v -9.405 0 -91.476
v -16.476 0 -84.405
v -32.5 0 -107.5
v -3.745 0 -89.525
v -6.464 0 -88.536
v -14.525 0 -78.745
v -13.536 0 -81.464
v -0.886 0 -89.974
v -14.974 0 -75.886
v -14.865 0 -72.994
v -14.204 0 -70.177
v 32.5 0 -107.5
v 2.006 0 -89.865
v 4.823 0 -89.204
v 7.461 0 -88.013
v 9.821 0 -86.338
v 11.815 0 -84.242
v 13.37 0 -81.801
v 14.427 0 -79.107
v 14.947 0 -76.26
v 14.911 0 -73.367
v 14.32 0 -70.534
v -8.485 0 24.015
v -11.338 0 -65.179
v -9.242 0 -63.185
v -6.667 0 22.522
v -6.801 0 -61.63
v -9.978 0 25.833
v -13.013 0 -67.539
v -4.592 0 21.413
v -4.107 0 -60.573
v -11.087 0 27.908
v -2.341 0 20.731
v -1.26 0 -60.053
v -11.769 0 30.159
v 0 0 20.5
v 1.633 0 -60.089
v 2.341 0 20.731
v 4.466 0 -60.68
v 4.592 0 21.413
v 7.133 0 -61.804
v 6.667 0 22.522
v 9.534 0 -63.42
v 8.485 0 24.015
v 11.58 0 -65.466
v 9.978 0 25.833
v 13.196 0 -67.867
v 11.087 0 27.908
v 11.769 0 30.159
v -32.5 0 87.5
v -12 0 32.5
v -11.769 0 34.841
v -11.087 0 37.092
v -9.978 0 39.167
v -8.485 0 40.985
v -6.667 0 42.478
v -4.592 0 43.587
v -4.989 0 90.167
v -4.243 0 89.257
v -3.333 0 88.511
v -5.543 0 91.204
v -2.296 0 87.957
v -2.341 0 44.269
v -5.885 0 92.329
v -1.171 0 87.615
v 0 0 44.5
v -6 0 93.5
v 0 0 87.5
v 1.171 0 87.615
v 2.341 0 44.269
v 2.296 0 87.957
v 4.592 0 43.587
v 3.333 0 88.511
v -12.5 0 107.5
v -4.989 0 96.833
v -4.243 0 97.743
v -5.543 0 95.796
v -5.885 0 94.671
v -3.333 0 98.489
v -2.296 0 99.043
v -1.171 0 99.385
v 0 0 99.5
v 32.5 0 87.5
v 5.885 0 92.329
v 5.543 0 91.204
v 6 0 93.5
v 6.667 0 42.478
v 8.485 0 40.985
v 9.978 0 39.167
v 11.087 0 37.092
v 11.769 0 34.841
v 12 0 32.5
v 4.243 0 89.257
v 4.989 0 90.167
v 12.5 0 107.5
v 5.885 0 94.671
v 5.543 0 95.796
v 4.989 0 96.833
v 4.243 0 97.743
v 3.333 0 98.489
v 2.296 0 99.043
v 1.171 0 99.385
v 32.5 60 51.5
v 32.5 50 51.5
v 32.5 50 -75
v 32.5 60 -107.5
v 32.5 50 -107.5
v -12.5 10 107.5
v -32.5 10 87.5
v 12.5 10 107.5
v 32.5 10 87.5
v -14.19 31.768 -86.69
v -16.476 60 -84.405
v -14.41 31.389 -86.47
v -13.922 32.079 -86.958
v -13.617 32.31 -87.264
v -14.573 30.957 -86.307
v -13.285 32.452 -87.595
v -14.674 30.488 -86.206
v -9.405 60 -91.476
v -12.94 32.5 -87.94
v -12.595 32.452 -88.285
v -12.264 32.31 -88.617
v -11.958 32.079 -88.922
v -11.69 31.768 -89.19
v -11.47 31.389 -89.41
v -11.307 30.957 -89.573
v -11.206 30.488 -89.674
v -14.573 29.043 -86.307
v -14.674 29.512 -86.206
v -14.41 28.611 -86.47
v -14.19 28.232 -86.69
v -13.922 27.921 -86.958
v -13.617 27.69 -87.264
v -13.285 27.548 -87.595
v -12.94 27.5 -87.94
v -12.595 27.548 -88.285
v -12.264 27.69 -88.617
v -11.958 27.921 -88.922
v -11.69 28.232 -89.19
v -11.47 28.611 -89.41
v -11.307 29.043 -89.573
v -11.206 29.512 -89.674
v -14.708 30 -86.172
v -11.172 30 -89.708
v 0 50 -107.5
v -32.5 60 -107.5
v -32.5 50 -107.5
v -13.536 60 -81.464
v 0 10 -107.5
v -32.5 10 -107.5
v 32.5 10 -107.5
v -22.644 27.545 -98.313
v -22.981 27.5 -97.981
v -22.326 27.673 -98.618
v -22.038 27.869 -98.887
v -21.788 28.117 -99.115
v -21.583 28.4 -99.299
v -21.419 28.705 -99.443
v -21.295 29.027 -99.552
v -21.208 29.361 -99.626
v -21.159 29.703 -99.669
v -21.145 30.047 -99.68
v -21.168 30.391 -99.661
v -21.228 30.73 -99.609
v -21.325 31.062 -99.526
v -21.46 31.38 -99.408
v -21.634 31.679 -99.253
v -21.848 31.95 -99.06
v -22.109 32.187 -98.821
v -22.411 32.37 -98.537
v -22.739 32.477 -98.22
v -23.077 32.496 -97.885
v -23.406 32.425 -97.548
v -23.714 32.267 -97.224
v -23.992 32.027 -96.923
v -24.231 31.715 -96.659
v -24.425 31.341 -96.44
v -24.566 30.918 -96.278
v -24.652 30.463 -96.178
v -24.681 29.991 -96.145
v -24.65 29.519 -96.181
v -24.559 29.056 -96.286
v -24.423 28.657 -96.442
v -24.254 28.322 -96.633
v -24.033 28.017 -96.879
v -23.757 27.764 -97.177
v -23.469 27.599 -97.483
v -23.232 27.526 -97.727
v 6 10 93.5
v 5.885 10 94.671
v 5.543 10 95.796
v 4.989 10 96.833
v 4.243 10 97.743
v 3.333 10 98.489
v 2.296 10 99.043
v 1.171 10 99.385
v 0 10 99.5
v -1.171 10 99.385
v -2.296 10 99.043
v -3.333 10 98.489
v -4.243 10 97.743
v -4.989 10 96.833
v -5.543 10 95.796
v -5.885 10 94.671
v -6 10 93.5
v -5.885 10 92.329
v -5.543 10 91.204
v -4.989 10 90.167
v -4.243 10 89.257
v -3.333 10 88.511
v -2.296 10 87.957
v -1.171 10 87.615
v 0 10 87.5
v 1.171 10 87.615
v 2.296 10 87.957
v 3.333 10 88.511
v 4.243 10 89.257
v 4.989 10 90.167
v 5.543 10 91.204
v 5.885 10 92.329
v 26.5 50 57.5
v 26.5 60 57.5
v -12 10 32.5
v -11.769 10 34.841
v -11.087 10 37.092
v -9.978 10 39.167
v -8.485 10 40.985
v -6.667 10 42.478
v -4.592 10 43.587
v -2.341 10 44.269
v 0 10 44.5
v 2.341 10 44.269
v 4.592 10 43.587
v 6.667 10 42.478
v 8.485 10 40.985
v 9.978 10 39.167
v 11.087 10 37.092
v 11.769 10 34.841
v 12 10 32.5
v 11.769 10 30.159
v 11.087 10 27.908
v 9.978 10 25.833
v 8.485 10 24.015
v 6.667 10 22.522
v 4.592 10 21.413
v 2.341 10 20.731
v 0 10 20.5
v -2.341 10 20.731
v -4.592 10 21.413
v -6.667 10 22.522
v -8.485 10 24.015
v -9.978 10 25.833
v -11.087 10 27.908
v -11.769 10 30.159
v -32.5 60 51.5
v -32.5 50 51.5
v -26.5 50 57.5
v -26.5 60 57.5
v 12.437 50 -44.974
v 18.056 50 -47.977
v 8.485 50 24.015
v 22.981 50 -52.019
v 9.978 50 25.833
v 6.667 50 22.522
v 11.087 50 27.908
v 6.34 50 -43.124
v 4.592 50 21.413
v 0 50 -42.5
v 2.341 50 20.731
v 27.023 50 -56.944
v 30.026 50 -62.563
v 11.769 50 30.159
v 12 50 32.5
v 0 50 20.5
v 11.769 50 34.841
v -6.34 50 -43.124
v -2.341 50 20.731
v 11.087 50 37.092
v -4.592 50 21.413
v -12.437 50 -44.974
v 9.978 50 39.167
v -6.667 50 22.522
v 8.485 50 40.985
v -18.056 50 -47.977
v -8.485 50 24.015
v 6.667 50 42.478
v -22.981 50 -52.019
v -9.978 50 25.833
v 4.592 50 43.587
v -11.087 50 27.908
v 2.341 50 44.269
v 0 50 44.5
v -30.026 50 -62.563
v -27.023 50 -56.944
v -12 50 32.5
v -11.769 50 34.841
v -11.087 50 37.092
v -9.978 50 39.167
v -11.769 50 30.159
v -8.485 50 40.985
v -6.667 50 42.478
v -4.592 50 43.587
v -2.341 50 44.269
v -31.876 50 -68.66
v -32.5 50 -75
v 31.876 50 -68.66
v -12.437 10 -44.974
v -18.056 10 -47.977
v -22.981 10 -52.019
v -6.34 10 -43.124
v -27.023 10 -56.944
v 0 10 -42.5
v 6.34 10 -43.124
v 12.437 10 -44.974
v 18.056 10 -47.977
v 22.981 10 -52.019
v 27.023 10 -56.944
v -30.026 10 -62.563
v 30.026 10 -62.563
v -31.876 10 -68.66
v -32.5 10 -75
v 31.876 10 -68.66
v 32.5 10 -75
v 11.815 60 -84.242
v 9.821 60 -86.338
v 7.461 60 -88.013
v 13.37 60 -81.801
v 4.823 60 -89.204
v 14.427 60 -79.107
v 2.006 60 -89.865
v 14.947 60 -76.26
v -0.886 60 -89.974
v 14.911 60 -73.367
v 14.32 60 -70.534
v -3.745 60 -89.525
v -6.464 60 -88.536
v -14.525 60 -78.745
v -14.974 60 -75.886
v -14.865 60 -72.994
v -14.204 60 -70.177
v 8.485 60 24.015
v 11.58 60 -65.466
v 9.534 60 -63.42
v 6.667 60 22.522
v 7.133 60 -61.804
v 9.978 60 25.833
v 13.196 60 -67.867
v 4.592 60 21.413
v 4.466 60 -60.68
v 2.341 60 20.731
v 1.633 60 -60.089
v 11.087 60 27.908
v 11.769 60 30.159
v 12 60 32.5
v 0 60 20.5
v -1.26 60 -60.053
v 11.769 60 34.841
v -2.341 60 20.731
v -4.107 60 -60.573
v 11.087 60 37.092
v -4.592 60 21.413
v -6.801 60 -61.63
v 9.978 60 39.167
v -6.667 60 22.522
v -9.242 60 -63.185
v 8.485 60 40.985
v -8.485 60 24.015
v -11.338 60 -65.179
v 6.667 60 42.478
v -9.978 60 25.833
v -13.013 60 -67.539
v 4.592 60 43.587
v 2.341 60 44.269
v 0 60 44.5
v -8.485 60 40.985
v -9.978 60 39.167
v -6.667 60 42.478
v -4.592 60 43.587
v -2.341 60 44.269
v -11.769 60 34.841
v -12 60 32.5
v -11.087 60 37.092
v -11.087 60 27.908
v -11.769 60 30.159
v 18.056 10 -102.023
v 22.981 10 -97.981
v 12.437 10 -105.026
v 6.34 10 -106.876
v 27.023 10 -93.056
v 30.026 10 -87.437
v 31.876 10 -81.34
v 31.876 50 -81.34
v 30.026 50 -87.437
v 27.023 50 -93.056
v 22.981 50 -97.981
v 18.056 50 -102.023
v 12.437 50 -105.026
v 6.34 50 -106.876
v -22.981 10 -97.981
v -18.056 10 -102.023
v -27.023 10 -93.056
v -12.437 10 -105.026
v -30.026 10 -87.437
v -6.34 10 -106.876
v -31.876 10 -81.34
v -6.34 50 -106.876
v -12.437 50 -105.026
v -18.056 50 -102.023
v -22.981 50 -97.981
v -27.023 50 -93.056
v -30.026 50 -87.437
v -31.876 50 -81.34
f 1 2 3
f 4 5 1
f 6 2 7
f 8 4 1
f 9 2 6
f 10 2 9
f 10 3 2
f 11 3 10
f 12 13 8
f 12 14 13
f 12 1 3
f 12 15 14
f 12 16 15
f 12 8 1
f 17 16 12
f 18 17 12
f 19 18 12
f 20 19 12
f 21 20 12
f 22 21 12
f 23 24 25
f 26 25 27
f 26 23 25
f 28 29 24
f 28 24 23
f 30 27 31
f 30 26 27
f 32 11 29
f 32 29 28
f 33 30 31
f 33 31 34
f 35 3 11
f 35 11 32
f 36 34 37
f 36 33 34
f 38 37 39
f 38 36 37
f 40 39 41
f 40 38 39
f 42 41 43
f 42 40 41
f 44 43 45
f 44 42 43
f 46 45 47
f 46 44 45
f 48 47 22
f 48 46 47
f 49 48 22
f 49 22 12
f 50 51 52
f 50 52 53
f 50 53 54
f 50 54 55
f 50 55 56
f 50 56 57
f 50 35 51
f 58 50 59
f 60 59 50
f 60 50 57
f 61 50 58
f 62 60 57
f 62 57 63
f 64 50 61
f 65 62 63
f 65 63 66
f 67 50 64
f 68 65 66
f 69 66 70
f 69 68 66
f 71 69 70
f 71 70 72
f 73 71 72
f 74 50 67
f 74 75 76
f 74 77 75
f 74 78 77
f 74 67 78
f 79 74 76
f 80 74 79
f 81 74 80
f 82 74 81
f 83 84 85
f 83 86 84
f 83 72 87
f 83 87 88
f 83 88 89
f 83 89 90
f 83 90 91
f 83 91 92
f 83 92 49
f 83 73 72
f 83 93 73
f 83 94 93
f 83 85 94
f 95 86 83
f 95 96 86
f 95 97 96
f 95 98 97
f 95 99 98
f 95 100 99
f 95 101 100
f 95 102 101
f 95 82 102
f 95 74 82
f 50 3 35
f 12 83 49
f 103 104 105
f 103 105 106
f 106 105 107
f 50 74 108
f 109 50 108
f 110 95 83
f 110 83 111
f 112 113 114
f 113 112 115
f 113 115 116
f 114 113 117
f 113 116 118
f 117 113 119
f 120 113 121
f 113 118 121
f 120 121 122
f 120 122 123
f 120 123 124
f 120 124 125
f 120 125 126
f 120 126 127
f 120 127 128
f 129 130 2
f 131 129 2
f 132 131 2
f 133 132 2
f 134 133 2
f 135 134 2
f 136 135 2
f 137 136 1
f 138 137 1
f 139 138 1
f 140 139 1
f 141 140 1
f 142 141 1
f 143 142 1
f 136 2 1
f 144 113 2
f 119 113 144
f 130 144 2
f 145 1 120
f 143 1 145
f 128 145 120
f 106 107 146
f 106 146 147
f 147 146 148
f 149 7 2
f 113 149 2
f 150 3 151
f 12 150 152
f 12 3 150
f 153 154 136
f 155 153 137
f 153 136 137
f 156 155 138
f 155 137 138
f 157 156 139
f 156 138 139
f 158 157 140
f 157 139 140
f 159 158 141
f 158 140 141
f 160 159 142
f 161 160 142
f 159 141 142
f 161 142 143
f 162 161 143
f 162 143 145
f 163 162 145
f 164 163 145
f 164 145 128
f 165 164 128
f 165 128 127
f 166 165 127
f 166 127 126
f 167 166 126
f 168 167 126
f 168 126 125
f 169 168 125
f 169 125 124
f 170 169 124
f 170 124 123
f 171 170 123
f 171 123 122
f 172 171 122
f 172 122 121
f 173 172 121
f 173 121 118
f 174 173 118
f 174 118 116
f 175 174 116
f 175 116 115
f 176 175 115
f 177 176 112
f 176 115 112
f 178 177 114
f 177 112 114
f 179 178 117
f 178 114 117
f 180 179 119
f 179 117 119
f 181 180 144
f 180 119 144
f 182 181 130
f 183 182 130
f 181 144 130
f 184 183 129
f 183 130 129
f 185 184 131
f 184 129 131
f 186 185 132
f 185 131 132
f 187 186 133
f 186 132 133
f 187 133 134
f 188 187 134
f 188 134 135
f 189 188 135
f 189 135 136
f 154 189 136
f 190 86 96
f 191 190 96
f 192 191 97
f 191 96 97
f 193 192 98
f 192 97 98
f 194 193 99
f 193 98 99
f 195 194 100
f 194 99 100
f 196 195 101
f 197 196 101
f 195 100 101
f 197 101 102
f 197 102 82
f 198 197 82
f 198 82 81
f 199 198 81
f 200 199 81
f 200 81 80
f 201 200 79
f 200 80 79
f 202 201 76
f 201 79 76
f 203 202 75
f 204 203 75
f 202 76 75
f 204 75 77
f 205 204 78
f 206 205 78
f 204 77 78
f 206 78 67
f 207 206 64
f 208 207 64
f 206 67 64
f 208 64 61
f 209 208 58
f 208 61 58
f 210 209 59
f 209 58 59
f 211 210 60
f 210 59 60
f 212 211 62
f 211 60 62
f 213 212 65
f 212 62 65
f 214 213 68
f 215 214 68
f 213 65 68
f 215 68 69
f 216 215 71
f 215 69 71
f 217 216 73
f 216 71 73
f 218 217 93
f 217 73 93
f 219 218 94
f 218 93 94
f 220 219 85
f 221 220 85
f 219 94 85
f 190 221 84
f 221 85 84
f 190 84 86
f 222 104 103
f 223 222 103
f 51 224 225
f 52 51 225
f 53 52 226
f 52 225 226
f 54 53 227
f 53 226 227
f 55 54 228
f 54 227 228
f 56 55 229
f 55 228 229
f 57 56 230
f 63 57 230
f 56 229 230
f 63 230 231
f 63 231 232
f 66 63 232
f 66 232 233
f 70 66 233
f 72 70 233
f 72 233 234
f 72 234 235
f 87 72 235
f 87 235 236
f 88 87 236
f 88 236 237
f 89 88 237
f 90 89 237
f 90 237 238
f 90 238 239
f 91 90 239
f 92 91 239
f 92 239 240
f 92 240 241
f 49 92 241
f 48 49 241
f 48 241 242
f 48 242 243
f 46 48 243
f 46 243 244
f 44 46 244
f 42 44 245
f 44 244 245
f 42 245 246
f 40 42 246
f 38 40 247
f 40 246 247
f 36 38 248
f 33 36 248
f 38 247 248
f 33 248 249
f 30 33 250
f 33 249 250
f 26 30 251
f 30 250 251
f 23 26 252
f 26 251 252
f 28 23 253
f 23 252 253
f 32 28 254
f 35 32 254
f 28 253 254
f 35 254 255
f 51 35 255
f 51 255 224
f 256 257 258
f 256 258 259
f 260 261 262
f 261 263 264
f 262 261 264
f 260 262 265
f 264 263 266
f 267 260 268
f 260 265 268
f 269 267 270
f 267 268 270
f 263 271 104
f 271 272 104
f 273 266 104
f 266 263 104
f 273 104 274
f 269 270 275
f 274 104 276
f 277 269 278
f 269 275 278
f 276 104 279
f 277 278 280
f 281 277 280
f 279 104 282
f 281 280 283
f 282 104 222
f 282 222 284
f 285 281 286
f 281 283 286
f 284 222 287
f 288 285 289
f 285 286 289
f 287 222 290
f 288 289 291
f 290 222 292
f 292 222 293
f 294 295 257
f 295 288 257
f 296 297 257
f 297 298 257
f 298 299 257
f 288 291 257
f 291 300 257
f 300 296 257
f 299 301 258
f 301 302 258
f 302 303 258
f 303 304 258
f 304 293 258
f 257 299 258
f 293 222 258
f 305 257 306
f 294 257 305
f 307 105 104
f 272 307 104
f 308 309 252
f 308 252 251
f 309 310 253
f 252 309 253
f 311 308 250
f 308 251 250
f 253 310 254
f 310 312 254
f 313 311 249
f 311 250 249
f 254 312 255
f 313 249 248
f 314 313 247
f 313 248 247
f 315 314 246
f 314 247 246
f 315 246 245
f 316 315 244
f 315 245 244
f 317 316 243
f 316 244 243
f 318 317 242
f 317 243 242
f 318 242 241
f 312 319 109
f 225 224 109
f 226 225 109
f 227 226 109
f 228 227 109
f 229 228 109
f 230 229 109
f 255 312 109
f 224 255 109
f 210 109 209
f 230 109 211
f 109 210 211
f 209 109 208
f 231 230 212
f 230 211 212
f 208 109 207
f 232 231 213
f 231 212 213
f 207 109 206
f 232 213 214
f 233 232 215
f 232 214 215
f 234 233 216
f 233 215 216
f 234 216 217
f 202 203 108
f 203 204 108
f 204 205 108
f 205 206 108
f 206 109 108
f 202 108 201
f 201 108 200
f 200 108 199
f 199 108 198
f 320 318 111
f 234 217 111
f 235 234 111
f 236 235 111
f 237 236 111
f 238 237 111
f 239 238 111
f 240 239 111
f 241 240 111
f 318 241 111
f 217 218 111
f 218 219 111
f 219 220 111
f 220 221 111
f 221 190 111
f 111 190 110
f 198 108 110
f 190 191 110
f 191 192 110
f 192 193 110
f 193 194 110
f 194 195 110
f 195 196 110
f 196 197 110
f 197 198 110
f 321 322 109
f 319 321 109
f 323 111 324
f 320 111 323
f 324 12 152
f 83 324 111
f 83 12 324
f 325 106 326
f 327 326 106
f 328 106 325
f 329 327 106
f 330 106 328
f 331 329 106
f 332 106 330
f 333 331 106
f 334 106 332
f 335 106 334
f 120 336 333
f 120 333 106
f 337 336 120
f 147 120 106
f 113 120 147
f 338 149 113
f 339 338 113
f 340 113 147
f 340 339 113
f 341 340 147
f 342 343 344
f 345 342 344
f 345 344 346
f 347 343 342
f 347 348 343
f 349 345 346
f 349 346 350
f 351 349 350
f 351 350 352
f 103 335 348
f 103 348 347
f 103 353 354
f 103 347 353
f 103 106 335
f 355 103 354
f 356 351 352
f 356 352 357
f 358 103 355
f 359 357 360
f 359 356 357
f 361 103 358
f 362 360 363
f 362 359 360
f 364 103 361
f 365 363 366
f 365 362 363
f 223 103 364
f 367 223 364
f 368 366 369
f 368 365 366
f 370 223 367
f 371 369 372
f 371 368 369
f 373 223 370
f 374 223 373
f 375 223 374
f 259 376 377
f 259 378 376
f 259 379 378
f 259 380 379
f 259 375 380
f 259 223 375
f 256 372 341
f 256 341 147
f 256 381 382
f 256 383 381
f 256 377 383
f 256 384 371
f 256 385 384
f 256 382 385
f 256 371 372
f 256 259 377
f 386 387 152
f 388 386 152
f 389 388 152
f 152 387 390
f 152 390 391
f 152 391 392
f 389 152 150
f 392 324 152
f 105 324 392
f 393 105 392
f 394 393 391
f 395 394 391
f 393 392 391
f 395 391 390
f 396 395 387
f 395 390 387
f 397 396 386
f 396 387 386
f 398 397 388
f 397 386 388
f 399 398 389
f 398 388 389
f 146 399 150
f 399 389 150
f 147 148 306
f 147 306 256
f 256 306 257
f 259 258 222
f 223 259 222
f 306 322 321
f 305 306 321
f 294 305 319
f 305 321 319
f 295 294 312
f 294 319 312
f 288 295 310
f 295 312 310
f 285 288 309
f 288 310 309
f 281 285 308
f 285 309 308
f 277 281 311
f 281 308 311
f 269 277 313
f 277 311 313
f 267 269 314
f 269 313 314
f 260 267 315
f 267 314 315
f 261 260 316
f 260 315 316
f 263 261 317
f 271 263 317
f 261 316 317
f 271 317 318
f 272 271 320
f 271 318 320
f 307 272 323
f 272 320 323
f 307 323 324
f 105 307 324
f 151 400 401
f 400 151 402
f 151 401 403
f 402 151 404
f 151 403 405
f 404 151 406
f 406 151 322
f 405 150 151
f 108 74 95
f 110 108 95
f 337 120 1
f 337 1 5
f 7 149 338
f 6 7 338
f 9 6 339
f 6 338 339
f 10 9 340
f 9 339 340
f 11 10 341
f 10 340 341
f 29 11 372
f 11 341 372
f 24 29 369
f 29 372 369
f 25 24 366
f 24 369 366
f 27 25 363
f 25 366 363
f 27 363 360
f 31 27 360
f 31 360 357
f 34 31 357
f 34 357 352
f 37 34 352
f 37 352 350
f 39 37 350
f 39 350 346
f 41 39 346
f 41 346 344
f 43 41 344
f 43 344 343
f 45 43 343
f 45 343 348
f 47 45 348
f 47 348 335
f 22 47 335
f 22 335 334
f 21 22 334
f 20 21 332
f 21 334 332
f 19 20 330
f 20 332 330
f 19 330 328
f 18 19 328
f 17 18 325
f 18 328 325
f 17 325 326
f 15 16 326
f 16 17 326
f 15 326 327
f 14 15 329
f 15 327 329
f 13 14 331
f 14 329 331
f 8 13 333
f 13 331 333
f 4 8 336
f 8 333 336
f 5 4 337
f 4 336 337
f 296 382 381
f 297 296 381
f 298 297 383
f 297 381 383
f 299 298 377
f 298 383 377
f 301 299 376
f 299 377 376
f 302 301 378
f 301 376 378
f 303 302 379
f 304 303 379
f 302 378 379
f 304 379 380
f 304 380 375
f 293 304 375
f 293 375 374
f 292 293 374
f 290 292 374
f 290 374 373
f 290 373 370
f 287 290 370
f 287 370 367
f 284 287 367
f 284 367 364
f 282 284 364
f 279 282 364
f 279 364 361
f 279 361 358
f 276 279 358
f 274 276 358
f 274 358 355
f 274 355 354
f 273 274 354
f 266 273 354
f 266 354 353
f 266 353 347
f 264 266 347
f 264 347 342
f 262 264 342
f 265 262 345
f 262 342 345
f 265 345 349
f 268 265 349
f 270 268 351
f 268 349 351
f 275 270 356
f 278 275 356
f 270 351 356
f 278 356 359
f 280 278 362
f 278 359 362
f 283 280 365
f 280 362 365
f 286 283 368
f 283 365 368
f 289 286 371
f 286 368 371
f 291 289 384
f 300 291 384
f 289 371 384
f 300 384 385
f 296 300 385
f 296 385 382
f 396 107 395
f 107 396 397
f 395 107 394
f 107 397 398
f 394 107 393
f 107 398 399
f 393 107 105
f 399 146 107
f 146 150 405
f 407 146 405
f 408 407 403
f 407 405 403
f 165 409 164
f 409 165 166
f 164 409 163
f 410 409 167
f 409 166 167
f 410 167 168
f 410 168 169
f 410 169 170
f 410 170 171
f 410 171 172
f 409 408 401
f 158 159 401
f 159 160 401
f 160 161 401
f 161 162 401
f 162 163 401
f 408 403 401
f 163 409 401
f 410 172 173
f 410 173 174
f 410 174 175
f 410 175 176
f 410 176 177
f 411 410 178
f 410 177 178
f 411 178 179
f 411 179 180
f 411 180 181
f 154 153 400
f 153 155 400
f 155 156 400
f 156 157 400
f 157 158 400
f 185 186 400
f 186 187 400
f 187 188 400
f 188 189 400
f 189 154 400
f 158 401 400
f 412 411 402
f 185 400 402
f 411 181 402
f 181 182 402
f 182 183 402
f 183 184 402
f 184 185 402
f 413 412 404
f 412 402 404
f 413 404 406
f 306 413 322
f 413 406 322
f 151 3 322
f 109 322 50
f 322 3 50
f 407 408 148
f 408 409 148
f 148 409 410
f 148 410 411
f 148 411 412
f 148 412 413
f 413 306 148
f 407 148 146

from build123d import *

# Parameters (mm, degrees)
F0_W      = 65
F0_H      = 215
F1_DEPTH  = 10
F2_SIZE   = 20
F4_DEPTH  = 40
F6_DEPTH  = 10
F7_SIZE   = 6
F9_D      = 30
F10_D     = 24
F12_DEPTH = 60.001
F13_R     = 6
F14_DEPTH = 10
F17_D     = 5
F17_DEPTH = 27.6629407771


with BuildPart() as f1:
    # F0 (on Front) → F1 (new body)
    with BuildSketch(Plane.XZ):
        Rectangle(F0_W, F0_H)
    extrude(amount=-F1_DEPTH)

    # F2
    f2_edges = [f1.edges().sort_by_distance(p)[0] for p in [
        (-32.5, 5, 107.5),
        (32.5, 5, 107.5),
    ]]
    chamfer(f2_edges, length=F2_SIZE)

    # F3 (on face) → F4 (join)
    with BuildSketch(Plane(origin=(0, 10, 0), x_dir=(-1, 0, 0), z_dir=(0, 1, 0))):
        with BuildLine():
            ThreePointArc((8.49e-08, -107.5), (22.9809704186, -97.9809703586), (32.5, -75))
            ThreePointArc((32.5, -75), (0, -42.5), (-32.5, -75))
            ThreePointArc((-32.5, -75), (-22.9809703586, -97.9809704186), (8.49e-08, -107.5))
        make_face()
    extrude(amount=F4_DEPTH)

    # F5 (on face) → F6 (join)
    with BuildSketch(Plane(origin=(0, 50, 0), x_dir=(-1, 0, 0), z_dir=(0, 1, 0))):
        with BuildLine():
            ThreePointArc((-32.5, -75), (0, -42.5), (32.5, -75))
            Line((32.5, -75), (32.5, 57.5))
            Line((32.5, 57.5), (-32.5, 57.5))
            Line((-32.5, 57.5), (-32.5, -75))
        make_face()
        with BuildLine():
            ThreePointArc((-32.5, -75), (-22.9809704241, -97.980970353), (-1.006e-07, -107.5))
            ThreePointArc((-1.006e-07, -107.5), (22.980970353, -97.9809704241), (32.5, -75))
            ThreePointArc((32.5, -75), (0, -42.5), (-32.5, -75))
        make_face()
        with BuildLine():
            Line((-32.5, -107.5), (-1.006e-07, -107.5))
            ThreePointArc((-1.006e-07, -107.5), (-22.9809704241, -97.980970353), (-32.5, -75))
            Line((-32.5, -75), (-32.5, -107.5))
        make_face()
        with BuildLine():
            Line((-1.006e-07, -107.5), (32.5, -107.5))
            Line((32.5, -107.5), (32.5, -75))
            ThreePointArc((32.5, -75), (22.980970353, -97.9809704241), (-1.006e-07, -107.5))
        make_face()
    extrude(amount=F6_DEPTH)

    # F7
    f7_edges = [f1.edges().sort_by_distance(p)[0] for p in [
        (32.5, 55, 57.5),
        (-32.5, 55, 57.5),
    ]]
    chamfer(f7_edges, length=F7_SIZE)

    # F9 (through all)
    with Locations(Plane.XZ):
        with Locations((0, -75)):
            Hole(F9_D / 2)

    # F10 (through all)
    with Locations(Plane.XZ):
        with Locations((0, 32.5)):
            Hole(F10_D / 2)

    # F11 (on face) → F12 (cut, through all)
    with BuildSketch(Plane.XZ):
        with BuildLine():
            ThreePointArc((-6.4644660941, -88.5355339059), (-10.6066017178, -85.6066017178), (-13.5355339059, -81.4644660941))
            Line((-13.5355339059, -81.4644660941), (-16.4755880016, -84.4045201898))
            Line((-16.4755880016, -84.4045201898), (-9.4045201898, -91.4755880016))
            Line((-9.4045201898, -91.4755880016), (-6.4644660941, -88.5355339059))
        make_face()
    extrude(amount=-F12_DEPTH, mode=Mode.SUBTRACT)

    # F13 (on face) → F14 (cut, through all)
    with BuildSketch(Plane.XZ):
        with Locations((0, 93.5)):
            Circle(F13_R)
    extrude(amount=-F14_DEPTH, mode=Mode.SUBTRACT)

    # F17 (through all, one way)
    with BuildSketch(Plane(origin=(-50.4400540957, 0, -50.4400540957), x_dir=(0, -1, 0), z_dir=(0.7071067812, 0, 0.7071067812))):
        with Locations((-30, 53.033008589)):
            Circle(F17_D / 2)
    extrude(amount=-F17_DEPTH, mode=Mode.SUBTRACT)


solid = f1.part
